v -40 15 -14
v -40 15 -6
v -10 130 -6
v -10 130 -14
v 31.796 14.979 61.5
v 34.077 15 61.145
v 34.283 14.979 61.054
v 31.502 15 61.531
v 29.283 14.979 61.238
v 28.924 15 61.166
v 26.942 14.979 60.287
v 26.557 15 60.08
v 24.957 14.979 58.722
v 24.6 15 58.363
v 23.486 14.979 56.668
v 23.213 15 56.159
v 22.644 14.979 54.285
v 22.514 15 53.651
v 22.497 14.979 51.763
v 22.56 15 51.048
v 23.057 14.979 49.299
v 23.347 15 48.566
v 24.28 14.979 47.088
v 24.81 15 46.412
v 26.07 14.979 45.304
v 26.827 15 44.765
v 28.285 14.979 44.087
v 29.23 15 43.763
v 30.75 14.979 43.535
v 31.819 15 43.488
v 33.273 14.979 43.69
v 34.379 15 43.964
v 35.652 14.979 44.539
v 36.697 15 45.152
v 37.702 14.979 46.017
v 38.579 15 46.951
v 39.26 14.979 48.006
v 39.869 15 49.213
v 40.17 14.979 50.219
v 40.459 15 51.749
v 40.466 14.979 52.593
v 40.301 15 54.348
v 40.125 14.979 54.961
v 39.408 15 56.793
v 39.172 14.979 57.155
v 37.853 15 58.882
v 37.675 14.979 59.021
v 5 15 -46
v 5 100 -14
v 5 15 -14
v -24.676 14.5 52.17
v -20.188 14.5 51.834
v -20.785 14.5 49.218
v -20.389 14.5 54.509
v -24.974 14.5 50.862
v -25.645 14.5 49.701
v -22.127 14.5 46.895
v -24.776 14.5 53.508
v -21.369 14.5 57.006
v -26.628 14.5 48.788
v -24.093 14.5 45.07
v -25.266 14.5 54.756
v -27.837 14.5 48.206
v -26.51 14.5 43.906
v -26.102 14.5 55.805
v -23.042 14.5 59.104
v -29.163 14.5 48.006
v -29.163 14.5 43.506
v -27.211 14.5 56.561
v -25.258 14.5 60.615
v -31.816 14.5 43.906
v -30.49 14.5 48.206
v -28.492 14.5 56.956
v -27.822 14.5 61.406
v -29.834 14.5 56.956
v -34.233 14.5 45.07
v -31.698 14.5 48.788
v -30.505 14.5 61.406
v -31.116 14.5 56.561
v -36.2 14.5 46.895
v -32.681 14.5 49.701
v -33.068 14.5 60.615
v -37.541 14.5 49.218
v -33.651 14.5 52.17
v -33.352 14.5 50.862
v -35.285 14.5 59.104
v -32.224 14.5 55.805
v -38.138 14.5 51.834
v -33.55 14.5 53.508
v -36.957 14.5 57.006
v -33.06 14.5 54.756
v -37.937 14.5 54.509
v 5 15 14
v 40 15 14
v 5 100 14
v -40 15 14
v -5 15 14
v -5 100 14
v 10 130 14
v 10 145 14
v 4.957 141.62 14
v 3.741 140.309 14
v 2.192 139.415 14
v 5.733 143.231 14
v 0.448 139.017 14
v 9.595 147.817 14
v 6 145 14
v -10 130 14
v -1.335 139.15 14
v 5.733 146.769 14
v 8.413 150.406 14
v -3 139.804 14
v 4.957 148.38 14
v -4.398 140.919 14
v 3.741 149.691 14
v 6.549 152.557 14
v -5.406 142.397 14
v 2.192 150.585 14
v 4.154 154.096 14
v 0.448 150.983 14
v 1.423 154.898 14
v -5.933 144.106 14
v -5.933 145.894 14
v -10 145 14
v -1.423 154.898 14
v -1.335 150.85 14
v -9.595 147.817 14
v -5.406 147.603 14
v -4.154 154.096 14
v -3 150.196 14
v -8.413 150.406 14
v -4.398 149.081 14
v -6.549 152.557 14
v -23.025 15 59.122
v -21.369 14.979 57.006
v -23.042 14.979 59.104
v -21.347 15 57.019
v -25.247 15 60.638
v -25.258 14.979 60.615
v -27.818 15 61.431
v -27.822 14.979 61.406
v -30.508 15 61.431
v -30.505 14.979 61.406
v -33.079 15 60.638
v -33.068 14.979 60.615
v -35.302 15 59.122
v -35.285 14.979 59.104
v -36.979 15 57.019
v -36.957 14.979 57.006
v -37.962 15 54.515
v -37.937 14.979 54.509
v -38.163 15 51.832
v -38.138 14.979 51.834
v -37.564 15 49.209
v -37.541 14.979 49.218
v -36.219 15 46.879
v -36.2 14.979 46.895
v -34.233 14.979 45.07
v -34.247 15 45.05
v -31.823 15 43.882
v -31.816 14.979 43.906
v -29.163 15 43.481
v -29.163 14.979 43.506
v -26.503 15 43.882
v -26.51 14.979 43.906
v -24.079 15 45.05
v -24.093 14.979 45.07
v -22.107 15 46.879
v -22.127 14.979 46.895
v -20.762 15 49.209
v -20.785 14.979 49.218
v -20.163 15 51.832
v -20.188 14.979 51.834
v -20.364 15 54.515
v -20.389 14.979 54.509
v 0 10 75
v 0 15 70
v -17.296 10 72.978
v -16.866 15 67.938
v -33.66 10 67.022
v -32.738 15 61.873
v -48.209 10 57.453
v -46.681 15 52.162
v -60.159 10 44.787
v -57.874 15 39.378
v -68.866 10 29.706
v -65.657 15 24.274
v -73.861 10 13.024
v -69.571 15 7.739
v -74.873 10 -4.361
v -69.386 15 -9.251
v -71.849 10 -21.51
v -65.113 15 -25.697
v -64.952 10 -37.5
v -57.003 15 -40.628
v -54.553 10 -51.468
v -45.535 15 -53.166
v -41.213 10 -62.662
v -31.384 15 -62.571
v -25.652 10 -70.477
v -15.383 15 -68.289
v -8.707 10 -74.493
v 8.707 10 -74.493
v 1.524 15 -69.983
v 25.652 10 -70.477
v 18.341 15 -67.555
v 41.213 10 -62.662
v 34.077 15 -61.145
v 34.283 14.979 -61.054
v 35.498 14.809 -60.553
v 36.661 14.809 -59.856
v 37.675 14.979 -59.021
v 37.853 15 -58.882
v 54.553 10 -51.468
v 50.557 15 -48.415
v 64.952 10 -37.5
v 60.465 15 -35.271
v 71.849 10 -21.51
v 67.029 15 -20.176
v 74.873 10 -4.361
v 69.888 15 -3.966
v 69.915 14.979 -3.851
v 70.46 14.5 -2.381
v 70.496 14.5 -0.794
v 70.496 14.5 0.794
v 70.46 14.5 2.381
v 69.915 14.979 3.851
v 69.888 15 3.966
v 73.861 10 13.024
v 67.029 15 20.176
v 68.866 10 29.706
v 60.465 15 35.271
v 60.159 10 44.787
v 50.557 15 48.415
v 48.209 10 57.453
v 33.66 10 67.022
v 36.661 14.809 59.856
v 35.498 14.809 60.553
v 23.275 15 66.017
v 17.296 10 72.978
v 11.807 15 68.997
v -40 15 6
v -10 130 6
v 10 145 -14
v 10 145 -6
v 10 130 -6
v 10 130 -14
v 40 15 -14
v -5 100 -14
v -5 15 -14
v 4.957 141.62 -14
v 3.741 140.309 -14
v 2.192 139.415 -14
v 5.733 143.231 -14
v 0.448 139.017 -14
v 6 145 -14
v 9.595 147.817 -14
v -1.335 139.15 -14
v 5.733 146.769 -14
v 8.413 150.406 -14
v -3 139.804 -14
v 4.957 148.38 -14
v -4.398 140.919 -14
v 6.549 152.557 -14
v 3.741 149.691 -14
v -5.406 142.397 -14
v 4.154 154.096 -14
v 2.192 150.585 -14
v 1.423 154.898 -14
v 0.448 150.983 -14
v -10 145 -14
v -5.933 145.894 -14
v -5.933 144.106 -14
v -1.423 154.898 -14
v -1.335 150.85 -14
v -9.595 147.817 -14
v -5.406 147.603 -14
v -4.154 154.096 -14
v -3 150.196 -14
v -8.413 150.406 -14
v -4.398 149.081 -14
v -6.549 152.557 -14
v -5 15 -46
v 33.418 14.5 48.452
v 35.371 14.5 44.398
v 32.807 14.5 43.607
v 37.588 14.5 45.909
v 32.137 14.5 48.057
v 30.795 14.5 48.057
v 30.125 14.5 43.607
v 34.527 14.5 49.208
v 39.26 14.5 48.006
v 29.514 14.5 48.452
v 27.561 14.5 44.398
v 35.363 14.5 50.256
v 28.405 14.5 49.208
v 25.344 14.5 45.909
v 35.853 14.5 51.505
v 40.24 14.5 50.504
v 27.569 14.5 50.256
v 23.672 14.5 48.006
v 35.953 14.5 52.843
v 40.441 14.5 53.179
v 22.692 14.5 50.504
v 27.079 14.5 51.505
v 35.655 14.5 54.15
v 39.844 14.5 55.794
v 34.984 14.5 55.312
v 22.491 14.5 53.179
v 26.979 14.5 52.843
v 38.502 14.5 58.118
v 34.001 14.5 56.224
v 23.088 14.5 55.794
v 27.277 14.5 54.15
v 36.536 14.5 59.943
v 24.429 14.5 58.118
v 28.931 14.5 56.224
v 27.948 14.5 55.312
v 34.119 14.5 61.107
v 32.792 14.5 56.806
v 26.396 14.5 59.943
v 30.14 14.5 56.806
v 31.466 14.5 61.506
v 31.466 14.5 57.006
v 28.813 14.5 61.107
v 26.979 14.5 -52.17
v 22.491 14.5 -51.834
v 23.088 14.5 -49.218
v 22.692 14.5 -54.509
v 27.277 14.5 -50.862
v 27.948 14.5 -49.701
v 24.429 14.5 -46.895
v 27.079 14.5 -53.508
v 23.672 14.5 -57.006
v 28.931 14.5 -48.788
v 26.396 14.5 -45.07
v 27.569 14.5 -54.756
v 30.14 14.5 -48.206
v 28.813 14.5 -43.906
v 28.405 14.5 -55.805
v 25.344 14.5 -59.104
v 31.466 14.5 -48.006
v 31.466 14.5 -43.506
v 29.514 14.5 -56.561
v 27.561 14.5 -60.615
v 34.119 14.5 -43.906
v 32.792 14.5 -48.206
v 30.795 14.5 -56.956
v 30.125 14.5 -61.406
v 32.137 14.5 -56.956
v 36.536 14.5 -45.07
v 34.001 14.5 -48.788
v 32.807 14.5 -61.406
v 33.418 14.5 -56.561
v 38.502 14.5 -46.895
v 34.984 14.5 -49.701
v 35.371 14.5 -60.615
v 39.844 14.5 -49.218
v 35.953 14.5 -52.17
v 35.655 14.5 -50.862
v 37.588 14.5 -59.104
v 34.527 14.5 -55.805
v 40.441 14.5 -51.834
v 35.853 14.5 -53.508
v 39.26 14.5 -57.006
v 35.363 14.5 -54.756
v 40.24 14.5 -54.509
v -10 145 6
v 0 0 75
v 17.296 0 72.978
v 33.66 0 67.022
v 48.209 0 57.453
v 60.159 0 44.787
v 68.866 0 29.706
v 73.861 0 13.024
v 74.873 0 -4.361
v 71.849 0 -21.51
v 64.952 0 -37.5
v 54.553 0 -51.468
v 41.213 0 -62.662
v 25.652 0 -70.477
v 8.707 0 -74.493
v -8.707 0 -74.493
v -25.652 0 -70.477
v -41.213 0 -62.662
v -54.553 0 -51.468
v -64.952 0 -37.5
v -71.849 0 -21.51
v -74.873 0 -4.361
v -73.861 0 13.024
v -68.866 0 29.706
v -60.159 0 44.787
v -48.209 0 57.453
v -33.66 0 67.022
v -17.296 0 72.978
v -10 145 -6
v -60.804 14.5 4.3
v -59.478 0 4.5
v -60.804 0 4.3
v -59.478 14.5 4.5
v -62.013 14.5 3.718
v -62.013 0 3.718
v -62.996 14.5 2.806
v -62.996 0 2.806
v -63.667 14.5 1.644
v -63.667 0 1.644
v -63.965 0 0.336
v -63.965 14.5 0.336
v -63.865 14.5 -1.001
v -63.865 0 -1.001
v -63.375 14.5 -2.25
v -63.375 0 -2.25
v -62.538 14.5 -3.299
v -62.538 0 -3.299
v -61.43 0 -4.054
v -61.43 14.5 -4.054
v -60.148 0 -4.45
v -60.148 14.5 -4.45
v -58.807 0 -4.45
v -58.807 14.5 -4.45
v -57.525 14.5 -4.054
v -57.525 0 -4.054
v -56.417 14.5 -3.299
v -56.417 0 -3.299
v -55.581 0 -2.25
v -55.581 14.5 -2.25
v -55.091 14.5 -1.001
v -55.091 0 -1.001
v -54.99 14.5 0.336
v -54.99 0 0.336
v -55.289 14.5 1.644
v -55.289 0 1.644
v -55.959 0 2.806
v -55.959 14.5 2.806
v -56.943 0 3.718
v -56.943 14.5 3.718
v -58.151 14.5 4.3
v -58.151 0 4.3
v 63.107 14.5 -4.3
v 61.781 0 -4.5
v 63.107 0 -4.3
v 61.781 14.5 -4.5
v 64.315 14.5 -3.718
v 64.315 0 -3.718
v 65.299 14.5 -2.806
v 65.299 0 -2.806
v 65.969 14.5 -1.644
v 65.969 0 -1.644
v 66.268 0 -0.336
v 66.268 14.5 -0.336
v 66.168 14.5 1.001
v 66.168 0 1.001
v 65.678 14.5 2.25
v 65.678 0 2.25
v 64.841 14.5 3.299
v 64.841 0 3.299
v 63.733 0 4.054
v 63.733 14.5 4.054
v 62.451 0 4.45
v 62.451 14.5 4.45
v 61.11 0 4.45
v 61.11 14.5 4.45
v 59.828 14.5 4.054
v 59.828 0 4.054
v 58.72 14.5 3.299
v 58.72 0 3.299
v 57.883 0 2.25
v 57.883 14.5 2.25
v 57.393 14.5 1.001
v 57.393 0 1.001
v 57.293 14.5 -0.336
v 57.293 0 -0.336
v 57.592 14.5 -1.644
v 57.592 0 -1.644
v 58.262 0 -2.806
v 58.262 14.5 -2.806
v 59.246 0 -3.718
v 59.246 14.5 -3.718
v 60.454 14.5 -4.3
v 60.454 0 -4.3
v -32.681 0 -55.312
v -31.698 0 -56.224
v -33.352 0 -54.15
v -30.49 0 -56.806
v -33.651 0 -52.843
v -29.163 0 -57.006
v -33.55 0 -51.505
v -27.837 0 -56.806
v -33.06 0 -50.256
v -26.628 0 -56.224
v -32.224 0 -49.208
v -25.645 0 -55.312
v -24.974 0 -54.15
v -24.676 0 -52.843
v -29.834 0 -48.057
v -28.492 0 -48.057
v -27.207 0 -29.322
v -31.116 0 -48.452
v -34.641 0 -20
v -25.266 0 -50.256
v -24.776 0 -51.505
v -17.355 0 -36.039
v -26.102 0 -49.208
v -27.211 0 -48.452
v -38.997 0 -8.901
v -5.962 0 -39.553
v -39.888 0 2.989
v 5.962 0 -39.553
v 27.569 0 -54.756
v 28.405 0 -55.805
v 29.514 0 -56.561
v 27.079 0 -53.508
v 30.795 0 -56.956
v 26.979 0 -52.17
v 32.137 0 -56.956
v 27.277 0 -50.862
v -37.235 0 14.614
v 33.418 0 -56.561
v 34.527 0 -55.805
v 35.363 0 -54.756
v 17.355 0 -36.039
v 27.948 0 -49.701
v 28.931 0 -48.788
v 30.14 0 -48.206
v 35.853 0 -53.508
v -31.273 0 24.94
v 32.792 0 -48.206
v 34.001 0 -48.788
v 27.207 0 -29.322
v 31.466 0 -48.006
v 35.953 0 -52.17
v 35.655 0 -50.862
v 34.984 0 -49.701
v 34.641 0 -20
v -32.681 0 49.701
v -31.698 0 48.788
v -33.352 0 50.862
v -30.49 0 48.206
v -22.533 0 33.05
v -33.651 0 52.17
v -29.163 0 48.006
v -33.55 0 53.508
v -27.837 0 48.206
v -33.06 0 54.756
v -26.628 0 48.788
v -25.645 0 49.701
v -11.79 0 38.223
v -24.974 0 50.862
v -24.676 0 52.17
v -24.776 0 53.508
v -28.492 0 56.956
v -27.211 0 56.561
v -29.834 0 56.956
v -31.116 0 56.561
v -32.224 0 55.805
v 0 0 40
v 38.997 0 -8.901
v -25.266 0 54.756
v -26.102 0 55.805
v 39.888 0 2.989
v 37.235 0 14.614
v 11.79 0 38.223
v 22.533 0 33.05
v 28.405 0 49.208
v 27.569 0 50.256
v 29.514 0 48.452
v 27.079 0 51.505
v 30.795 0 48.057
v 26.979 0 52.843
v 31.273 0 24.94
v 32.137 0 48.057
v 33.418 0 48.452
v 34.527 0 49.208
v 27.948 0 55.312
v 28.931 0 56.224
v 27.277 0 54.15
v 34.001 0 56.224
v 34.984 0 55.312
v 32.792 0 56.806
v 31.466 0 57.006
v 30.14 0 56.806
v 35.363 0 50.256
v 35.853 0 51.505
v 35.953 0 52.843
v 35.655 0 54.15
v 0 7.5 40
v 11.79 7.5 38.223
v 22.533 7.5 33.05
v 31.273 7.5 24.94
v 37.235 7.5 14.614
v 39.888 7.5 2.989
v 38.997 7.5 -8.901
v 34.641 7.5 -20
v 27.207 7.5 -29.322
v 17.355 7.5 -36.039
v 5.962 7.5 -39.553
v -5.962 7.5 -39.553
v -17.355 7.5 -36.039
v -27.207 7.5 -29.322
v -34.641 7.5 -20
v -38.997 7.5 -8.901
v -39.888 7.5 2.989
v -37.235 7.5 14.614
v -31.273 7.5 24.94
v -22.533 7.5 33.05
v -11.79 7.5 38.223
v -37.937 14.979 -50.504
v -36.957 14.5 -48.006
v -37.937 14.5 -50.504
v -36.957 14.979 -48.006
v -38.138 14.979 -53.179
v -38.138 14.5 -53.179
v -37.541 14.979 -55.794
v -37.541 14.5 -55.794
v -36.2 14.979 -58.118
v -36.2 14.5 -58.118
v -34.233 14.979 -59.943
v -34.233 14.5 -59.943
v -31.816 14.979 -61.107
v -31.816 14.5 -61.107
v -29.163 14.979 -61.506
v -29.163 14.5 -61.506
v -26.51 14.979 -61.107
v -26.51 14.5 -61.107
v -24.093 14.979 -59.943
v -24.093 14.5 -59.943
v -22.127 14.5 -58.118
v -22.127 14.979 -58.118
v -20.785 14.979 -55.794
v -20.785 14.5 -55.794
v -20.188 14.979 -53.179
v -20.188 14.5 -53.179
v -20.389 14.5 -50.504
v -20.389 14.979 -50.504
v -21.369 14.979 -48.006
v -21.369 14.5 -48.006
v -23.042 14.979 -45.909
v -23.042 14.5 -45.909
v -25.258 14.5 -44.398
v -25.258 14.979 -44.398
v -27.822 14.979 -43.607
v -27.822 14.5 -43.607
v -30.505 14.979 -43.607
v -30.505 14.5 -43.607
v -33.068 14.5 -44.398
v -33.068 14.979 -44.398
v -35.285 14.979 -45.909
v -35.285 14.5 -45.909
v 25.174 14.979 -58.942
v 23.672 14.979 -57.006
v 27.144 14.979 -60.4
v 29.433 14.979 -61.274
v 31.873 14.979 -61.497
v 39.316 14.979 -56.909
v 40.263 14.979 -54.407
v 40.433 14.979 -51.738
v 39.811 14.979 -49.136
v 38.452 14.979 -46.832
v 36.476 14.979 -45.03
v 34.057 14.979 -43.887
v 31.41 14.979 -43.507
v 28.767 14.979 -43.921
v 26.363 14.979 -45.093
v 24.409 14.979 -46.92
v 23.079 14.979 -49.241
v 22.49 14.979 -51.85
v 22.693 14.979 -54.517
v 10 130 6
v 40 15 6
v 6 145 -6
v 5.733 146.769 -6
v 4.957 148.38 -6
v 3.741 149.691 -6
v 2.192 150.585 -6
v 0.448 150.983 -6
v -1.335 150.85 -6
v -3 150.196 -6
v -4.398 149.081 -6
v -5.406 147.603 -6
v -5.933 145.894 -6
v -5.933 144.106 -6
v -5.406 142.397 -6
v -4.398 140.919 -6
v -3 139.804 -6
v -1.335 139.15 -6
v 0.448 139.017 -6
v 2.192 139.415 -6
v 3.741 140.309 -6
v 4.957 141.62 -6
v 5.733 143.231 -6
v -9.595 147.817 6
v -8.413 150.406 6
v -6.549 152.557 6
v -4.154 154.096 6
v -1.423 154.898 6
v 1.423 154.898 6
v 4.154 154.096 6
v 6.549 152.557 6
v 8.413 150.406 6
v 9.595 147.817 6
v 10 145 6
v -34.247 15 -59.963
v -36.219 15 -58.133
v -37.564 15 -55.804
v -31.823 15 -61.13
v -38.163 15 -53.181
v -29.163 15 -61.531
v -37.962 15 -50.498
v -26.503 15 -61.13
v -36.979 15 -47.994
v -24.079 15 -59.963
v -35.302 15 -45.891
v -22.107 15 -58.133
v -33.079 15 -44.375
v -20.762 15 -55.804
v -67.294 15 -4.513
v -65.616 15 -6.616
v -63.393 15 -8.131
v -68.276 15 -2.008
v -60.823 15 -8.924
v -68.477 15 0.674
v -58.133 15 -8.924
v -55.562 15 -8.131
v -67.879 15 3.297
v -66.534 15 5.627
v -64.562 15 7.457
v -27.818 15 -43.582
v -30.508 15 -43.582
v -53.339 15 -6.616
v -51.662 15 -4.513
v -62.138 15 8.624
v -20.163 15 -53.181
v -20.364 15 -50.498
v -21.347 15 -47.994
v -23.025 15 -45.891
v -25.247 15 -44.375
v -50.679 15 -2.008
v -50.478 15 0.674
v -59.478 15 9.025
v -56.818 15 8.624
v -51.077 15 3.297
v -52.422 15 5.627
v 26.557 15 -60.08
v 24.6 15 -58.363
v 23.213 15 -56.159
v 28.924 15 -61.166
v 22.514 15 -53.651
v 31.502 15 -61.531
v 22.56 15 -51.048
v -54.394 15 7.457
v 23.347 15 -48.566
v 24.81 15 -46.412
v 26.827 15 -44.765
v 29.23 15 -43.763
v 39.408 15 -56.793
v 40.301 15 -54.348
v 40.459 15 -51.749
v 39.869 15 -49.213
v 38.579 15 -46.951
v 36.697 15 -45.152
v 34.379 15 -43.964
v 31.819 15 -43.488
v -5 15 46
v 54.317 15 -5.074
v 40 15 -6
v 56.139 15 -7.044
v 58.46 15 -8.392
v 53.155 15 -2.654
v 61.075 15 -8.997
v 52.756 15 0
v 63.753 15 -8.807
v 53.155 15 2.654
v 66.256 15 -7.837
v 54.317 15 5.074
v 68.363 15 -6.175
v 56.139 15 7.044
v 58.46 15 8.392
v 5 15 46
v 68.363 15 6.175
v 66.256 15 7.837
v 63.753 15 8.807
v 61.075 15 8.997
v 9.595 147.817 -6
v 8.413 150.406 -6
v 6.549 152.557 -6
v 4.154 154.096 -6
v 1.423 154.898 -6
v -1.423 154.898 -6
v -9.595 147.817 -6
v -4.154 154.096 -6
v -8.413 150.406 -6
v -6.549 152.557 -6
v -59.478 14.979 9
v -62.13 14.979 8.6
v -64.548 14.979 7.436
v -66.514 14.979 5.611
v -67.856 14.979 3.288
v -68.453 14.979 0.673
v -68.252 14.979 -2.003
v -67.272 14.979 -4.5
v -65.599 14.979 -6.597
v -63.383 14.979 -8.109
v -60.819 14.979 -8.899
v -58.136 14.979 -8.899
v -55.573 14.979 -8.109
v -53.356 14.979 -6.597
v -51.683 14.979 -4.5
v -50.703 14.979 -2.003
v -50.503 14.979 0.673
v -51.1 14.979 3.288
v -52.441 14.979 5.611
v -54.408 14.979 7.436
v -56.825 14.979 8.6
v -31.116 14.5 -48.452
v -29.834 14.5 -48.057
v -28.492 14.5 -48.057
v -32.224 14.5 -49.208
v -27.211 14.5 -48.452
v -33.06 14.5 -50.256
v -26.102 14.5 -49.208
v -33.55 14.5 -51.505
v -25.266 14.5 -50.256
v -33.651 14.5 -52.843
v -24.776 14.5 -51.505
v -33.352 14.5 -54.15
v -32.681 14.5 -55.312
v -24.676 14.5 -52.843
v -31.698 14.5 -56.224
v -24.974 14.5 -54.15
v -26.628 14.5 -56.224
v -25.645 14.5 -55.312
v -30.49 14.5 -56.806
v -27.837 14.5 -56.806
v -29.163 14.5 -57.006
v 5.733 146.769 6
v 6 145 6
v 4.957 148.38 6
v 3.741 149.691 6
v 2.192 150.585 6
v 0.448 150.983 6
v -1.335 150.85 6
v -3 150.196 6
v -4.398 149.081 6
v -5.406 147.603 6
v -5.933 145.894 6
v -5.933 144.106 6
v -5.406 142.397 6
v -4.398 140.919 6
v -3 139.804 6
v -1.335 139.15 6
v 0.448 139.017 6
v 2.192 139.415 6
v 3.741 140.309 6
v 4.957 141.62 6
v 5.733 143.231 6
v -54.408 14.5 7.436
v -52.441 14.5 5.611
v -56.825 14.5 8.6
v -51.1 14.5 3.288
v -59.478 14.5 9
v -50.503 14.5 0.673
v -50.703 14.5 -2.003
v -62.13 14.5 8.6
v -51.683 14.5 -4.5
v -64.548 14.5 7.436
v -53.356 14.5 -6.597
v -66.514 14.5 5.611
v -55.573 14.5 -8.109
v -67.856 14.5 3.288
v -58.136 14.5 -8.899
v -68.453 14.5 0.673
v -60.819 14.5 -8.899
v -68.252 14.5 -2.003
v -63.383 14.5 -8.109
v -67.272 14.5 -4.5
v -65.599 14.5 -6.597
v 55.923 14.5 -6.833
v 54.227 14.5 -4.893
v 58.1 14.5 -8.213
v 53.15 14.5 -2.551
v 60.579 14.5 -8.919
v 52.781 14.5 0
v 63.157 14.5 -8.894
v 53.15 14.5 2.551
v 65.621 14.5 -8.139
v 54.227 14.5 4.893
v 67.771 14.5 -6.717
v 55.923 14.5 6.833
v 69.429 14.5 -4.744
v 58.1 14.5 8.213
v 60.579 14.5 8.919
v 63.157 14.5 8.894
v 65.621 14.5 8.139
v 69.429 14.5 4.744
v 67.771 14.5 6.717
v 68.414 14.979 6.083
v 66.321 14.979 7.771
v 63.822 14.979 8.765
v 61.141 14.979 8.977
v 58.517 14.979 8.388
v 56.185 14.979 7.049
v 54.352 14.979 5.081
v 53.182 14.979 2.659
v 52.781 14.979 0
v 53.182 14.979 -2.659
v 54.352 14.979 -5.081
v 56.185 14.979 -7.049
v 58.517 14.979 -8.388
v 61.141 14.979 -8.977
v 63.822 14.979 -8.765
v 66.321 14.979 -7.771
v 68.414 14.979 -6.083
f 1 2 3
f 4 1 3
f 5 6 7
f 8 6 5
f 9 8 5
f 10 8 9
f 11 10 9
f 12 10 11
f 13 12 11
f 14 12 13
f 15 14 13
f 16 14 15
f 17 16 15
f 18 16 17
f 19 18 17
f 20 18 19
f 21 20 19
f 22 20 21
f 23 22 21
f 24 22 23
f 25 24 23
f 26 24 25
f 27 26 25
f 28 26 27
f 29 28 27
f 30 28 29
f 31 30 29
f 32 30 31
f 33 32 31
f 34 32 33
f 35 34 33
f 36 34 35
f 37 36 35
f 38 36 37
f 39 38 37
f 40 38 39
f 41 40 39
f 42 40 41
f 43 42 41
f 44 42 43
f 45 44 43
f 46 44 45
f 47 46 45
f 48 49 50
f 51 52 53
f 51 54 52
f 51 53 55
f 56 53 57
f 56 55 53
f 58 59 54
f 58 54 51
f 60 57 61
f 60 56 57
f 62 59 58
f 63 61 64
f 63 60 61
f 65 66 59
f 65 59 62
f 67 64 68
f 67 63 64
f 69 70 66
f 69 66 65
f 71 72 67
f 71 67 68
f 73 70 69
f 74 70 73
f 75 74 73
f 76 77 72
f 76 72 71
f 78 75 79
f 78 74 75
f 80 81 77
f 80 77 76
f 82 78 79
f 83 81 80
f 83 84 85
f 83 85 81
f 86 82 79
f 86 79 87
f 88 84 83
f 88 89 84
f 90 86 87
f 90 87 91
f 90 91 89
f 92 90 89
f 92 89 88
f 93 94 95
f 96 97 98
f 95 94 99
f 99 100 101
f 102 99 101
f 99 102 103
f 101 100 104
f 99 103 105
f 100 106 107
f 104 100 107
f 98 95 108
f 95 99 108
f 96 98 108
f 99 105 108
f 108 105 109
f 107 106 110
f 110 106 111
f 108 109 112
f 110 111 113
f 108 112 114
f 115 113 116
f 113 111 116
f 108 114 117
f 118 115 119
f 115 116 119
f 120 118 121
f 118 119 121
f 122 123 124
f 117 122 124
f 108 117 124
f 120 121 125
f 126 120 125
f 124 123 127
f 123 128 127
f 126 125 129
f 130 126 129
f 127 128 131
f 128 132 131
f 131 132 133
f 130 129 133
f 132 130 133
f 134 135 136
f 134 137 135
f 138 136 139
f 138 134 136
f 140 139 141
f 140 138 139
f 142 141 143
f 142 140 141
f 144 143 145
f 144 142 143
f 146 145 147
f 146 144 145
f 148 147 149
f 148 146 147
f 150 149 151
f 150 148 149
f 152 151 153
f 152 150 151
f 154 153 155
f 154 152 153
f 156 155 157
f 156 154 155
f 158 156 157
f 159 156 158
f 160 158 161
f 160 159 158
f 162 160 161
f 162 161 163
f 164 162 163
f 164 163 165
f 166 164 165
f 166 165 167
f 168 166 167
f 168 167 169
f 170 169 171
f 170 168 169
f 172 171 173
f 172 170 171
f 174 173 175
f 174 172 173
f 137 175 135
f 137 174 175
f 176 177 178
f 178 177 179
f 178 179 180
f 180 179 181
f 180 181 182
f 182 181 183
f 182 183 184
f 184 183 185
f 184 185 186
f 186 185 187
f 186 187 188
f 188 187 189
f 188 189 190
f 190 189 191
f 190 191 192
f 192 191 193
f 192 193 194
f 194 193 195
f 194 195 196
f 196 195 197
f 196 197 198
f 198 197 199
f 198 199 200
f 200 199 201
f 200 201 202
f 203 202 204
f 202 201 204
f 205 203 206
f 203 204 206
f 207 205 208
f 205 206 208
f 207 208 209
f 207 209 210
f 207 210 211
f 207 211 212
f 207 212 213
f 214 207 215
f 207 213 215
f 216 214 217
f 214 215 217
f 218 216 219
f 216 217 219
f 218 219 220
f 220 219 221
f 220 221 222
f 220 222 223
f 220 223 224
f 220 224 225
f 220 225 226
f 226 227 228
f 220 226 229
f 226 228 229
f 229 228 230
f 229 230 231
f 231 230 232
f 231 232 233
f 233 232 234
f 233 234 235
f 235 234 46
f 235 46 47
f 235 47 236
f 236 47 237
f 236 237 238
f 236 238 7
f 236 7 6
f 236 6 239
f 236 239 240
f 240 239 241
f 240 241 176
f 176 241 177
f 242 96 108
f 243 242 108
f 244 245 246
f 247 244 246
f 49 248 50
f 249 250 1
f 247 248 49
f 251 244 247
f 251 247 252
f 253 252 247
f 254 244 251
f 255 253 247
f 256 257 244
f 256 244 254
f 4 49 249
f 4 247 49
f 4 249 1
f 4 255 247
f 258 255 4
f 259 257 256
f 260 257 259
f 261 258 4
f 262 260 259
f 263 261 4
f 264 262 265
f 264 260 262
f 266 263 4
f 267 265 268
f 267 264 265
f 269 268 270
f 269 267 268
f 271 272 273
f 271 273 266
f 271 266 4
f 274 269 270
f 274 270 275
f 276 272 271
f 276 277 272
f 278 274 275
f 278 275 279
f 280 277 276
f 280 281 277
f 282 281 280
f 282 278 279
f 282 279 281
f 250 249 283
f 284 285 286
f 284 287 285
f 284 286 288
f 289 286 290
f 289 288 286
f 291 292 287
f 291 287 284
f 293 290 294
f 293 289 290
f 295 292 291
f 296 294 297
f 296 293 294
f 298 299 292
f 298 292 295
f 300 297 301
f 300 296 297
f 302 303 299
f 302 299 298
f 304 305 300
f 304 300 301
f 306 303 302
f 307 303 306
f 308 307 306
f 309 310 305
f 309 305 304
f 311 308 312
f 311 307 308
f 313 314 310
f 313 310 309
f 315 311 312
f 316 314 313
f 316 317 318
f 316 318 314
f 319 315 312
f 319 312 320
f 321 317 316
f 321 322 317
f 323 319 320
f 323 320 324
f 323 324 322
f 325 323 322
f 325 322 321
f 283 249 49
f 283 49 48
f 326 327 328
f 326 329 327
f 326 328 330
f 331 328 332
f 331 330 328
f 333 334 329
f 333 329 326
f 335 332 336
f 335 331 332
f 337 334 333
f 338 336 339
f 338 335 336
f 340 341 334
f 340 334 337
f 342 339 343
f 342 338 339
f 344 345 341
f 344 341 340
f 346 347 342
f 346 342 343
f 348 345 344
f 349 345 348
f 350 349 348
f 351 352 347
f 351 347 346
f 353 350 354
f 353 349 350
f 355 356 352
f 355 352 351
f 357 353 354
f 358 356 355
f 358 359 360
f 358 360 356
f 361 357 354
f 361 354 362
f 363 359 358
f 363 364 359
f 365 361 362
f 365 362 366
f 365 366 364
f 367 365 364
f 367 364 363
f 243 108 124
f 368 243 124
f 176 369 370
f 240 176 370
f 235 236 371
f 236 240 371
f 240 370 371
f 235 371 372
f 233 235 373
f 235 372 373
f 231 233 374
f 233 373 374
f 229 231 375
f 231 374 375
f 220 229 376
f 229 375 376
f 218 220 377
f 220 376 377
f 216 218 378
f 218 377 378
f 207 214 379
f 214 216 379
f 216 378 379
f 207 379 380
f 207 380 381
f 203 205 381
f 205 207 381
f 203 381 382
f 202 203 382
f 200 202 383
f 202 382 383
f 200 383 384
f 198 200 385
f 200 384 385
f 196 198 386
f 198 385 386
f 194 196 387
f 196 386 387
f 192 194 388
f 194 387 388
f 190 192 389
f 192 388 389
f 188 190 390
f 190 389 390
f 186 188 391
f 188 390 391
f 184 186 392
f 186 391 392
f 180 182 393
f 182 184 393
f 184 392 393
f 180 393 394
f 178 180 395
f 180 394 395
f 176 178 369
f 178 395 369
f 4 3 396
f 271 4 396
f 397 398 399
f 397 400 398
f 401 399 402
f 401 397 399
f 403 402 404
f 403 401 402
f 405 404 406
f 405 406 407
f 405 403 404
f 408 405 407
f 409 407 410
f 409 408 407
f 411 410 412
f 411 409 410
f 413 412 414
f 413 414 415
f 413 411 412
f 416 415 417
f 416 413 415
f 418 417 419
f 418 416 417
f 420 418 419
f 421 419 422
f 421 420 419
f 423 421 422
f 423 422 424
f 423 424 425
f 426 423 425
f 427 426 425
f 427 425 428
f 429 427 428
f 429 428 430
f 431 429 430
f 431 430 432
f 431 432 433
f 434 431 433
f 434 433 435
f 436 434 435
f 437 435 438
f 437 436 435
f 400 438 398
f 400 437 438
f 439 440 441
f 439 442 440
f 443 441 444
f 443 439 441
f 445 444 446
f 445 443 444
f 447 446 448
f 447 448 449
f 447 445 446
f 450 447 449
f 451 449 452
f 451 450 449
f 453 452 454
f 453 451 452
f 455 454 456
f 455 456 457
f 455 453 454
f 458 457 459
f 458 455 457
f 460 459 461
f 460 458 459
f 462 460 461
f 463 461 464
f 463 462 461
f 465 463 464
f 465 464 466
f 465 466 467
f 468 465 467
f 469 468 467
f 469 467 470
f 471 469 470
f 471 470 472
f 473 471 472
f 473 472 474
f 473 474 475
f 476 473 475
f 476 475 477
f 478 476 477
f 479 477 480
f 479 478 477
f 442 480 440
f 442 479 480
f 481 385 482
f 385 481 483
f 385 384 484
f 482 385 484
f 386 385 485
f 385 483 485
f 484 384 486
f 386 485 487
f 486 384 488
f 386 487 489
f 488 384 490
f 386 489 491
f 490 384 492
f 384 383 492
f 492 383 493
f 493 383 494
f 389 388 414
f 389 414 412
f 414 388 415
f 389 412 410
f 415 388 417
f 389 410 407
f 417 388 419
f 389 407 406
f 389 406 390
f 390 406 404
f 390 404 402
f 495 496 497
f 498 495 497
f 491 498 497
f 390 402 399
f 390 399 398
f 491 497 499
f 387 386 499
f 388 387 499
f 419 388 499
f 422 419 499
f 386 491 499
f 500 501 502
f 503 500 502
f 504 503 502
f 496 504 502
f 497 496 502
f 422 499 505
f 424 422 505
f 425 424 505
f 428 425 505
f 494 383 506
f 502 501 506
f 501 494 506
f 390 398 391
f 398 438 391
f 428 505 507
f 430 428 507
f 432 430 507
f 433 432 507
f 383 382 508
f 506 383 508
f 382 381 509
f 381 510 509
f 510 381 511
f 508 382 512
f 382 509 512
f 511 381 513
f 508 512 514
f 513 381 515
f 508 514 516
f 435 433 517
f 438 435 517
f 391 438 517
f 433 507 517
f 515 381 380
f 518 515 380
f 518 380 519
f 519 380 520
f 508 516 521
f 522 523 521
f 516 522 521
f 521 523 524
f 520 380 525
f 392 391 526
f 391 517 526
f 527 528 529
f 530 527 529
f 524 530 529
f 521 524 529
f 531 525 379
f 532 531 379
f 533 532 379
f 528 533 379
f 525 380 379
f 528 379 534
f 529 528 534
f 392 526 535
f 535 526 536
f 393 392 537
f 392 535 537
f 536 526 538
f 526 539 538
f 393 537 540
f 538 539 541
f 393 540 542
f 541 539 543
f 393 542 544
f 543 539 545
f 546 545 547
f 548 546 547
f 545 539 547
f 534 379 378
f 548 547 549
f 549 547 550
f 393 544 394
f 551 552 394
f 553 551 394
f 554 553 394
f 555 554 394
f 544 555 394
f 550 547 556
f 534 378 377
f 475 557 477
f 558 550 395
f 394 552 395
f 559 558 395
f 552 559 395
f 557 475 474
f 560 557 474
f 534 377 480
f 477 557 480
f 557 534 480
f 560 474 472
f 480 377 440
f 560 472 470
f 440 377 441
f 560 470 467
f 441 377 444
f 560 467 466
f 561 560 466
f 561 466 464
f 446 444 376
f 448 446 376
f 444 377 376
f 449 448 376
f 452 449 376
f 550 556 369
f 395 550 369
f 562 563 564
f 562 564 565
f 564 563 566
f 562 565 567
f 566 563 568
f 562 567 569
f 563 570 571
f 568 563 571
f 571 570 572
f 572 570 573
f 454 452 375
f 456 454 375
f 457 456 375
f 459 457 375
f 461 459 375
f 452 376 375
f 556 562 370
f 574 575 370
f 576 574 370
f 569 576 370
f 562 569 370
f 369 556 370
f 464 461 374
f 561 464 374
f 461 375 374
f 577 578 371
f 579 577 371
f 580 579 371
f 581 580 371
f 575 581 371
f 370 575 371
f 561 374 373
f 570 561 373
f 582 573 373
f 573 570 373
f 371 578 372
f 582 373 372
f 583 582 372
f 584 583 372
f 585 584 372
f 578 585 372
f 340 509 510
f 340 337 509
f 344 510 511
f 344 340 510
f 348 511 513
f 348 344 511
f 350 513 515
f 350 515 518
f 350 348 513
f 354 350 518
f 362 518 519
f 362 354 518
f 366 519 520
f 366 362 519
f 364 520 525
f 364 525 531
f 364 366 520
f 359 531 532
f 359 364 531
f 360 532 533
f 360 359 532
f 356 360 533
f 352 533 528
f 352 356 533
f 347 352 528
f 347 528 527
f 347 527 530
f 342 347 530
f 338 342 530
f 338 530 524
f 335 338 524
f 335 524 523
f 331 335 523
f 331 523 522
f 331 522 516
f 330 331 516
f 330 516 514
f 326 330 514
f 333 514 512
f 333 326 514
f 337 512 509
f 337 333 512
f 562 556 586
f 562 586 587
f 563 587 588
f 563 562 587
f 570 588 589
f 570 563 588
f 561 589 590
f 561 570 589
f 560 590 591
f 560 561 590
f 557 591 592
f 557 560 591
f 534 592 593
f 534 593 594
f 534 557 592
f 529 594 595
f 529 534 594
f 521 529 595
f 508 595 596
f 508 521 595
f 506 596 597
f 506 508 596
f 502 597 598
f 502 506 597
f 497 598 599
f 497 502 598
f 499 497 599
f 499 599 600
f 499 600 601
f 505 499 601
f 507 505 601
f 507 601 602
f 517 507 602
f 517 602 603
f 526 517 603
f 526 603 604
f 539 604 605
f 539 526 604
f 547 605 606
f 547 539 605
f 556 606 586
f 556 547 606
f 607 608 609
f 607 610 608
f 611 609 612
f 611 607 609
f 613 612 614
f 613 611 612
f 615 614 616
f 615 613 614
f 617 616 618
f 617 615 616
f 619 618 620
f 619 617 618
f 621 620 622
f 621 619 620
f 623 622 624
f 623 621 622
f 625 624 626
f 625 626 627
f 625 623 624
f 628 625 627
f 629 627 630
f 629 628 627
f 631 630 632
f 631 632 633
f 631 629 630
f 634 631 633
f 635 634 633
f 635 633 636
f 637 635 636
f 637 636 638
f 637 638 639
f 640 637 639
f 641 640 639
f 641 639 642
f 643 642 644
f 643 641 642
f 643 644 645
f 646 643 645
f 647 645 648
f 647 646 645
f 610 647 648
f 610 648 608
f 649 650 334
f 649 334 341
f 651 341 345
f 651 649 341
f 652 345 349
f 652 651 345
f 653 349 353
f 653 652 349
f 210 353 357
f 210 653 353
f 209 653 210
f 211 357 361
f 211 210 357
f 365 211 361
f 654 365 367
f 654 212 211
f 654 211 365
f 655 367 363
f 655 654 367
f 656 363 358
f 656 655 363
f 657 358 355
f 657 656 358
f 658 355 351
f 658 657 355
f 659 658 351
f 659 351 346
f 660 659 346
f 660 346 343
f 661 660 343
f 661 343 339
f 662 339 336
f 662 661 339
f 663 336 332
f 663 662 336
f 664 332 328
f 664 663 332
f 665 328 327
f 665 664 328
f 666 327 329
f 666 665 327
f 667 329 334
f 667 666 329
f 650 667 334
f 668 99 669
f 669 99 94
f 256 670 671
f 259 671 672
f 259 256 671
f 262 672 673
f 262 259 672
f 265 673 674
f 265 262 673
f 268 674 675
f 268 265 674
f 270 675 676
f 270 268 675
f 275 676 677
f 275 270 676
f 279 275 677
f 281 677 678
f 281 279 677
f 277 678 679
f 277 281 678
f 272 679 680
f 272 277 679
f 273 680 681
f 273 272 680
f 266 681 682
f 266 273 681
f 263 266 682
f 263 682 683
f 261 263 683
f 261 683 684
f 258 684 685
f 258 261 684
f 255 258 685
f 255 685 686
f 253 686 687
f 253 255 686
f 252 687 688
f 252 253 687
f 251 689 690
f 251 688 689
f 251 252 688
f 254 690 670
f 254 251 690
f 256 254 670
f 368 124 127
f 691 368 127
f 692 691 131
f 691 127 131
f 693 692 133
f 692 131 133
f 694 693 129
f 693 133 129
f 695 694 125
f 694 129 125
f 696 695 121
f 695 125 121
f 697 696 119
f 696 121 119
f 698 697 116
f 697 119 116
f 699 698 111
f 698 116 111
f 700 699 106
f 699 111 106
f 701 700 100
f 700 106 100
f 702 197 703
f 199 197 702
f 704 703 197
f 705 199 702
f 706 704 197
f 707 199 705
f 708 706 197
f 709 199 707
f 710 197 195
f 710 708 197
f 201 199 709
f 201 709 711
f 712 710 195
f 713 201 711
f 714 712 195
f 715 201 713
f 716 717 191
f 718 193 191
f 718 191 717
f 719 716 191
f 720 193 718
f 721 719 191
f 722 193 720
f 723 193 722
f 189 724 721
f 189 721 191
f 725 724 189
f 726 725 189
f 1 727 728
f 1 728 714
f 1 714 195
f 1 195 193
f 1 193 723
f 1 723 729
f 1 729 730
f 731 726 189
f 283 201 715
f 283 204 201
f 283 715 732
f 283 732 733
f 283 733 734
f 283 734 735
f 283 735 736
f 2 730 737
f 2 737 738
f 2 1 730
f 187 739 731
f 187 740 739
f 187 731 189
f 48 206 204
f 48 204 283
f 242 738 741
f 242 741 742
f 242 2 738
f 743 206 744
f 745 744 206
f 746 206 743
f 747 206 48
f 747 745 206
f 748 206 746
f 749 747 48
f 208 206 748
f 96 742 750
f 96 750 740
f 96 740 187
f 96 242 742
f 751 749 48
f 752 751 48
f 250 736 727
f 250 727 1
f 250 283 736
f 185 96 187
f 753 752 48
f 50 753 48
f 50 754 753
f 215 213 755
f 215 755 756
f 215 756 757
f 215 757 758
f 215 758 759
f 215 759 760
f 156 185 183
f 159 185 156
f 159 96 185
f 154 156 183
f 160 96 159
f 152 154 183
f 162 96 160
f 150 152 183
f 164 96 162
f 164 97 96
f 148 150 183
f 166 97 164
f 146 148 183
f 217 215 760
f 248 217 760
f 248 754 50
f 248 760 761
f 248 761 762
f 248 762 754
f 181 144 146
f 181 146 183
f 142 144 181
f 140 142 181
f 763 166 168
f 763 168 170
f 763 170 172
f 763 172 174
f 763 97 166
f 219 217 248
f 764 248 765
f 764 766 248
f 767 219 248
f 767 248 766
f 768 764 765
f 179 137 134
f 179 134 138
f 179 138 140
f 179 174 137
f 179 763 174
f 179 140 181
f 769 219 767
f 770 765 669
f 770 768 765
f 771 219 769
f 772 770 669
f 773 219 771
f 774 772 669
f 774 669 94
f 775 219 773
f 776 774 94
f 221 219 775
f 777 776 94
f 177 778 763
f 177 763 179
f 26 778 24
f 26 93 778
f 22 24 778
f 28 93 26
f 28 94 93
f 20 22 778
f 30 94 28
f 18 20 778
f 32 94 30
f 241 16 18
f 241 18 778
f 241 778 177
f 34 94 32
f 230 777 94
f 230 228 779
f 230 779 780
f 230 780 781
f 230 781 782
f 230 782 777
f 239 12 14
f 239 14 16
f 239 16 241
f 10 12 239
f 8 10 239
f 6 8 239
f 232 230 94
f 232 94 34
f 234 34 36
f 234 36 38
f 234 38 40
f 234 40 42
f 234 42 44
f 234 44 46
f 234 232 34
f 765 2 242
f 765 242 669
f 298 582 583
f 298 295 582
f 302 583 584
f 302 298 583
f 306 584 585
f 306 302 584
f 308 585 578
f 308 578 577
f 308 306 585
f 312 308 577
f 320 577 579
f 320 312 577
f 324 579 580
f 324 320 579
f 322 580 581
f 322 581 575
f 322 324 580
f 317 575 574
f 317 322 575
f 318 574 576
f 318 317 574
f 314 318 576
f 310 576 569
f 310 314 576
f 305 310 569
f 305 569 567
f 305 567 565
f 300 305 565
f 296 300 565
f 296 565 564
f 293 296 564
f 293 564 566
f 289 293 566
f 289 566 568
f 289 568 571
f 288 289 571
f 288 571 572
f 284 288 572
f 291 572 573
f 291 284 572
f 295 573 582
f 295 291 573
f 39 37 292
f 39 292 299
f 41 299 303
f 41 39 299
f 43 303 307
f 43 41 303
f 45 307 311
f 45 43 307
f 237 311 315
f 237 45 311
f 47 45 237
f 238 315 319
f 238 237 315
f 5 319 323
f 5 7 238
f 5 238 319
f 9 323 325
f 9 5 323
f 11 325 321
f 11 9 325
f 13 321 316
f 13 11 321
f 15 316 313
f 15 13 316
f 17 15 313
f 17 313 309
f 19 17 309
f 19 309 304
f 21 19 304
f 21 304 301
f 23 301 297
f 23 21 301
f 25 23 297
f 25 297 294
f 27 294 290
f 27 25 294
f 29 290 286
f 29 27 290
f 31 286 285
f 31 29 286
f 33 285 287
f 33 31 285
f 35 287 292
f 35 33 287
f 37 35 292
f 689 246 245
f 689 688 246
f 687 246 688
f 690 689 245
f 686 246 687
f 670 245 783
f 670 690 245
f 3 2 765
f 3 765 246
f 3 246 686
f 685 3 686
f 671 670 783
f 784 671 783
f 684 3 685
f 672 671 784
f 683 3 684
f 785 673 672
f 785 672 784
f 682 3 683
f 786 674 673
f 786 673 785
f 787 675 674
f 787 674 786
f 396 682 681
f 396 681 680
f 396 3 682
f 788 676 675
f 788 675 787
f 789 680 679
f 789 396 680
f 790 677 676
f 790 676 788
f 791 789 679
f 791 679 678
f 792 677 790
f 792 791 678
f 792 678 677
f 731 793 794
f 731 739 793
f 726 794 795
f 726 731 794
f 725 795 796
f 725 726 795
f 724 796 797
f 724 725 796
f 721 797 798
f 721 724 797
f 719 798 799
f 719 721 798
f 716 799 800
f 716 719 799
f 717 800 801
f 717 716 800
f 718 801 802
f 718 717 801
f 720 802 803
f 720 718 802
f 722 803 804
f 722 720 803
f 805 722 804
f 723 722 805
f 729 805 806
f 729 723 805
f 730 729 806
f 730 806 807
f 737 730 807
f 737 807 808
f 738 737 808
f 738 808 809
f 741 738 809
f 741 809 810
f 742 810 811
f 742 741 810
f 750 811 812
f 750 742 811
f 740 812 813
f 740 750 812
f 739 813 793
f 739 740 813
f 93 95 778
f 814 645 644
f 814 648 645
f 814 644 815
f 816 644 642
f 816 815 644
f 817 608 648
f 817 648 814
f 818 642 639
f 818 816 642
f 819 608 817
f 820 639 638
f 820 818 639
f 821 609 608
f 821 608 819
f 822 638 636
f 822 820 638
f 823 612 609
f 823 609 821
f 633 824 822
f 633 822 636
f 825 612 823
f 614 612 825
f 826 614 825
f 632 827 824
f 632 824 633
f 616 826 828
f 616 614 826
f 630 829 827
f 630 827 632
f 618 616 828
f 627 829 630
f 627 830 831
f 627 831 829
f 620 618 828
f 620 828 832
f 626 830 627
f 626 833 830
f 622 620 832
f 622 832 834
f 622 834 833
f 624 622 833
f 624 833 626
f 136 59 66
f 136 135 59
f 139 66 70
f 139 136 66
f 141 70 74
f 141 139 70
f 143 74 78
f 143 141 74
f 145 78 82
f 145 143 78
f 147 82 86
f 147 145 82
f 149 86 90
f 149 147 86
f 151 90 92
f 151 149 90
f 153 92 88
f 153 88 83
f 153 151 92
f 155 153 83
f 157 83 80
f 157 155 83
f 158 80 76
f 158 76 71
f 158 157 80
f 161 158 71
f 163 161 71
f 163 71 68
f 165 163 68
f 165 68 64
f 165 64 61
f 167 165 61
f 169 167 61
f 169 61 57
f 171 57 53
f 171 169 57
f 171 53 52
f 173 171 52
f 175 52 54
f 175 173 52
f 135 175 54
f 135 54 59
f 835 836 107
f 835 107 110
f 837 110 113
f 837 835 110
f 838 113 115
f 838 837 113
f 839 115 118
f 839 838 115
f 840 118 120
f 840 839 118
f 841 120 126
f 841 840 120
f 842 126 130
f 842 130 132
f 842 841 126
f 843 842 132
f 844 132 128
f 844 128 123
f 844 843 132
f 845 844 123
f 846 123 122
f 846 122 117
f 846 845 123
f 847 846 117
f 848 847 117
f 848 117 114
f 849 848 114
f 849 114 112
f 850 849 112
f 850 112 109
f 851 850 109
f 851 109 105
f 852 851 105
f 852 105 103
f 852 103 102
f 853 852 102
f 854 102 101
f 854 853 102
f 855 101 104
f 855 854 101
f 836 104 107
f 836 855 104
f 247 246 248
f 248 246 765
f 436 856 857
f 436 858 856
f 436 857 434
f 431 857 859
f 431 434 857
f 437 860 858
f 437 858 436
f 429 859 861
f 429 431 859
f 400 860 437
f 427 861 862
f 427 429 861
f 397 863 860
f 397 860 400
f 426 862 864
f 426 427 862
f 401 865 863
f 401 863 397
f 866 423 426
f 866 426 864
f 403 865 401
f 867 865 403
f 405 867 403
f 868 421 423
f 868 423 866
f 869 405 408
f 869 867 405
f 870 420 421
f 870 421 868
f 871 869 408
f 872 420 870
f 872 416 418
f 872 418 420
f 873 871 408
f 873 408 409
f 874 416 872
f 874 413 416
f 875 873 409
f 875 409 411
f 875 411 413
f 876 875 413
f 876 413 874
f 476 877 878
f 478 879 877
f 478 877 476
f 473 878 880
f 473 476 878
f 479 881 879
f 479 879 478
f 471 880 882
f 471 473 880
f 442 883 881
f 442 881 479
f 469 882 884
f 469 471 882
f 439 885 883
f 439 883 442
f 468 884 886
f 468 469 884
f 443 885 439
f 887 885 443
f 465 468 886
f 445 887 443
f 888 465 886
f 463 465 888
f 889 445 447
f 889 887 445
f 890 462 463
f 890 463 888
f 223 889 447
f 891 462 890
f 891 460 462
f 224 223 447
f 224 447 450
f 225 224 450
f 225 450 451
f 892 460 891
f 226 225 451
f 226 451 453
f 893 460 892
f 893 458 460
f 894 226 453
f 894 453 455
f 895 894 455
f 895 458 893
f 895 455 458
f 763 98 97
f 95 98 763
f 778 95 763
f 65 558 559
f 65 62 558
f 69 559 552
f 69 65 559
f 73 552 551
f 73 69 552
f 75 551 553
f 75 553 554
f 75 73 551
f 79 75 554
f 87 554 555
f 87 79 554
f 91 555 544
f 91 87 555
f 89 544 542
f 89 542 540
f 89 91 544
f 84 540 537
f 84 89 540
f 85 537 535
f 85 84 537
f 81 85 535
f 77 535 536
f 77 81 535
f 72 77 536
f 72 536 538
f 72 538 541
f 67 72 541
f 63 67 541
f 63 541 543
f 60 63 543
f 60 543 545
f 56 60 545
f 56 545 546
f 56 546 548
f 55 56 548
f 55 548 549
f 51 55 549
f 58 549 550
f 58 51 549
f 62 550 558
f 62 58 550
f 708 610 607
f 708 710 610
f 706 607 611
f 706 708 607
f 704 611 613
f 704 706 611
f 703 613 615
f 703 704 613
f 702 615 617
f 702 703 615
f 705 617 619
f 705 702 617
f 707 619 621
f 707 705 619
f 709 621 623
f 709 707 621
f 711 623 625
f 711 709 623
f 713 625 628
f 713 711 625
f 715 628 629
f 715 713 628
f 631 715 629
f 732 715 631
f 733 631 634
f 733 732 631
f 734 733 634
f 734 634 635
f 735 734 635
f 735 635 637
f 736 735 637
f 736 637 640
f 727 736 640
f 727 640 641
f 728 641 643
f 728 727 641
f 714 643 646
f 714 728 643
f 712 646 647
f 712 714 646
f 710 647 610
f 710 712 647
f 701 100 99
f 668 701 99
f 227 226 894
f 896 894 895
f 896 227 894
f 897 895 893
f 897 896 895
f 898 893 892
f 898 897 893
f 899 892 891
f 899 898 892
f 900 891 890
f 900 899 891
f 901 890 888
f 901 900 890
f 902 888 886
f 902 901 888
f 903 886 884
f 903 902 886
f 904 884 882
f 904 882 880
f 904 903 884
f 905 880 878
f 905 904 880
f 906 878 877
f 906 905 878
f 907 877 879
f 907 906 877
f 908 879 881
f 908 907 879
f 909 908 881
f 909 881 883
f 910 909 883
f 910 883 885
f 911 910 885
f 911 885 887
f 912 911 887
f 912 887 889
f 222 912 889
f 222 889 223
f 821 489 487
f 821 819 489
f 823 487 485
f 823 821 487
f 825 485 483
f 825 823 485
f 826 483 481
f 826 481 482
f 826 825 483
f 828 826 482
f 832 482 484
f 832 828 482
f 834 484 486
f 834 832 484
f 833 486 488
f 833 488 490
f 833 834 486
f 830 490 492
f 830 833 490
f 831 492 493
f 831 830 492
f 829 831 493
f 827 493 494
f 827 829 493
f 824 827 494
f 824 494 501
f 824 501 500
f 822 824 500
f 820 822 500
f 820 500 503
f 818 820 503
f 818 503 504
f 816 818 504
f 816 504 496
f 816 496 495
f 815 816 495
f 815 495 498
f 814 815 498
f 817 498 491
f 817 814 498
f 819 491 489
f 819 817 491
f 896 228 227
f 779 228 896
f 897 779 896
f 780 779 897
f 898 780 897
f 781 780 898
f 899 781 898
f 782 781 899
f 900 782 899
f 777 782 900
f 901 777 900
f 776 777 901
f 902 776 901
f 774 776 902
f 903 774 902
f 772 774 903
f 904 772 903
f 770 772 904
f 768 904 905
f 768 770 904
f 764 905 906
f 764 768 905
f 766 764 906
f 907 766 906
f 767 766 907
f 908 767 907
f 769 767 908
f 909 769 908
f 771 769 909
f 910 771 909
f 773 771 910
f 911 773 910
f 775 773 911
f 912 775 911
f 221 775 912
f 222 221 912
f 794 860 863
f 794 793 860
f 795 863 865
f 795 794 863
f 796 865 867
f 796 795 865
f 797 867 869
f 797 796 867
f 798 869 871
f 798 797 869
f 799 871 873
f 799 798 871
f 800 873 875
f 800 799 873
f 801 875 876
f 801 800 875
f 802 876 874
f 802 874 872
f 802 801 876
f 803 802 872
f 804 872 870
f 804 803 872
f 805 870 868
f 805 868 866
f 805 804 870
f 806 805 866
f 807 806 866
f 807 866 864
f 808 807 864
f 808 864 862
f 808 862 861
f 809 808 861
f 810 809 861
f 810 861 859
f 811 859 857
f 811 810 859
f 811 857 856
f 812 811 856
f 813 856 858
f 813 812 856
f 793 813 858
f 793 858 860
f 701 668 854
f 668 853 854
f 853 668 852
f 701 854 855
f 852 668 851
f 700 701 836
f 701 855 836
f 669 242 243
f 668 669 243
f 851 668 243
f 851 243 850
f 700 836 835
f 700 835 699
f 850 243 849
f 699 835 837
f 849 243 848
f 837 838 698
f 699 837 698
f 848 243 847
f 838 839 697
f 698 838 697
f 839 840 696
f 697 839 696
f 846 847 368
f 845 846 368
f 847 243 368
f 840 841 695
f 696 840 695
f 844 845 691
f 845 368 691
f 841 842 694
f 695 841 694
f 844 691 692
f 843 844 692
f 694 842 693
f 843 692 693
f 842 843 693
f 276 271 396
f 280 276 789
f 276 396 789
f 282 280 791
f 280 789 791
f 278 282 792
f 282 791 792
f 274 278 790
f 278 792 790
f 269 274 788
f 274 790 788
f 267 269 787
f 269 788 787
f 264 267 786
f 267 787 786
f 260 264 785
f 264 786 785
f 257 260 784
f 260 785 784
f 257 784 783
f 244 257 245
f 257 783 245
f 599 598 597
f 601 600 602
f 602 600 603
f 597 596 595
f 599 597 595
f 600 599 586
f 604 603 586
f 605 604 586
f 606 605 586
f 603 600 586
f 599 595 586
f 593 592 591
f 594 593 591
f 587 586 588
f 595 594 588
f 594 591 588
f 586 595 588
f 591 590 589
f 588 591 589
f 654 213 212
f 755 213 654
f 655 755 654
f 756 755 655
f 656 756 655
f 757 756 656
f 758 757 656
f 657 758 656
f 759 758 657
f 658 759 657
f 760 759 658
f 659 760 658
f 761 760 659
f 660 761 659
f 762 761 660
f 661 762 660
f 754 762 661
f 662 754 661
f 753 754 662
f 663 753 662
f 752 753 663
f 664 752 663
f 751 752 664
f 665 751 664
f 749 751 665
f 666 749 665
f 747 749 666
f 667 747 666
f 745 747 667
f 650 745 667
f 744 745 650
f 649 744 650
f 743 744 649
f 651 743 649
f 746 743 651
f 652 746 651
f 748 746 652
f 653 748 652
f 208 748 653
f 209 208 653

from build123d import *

# Parameters (mm, degrees)
SKETCH_2_R               = 75
EXTRUDE_1_DEPTH          = 15
SKETCH_3_R               = 6
EXTRUDE_2_DEPTH          = 14
CUT_EXTRUDE_2_DEPTH      = 188.81639971
CUT_EXTRUDE_2_DEPTH_BACK = 188.81639971
SKETCH_4_W               = 12
SKETCH_4_H               = 150
SKETCH_5_R               = 40
CUT_EXTRUDE_3_DEPTH      = 7.5
CHAMFER_2_SIZE           = 5
RIB_21_REACH             = 189.816
SKETCH_8_WALL_W          = 468.456805058
SKETCH_8_WALL_H          = 10
PATTERN_CIRCULAR_3_COUNT = 6


with BuildPart() as part:
    # 草图2 → 凸台-拉伸1 (new body)
    with BuildSketch(Plane(origin=(0, 0, 0), x_dir=(1, 0, 0), z_dir=(0, 1, 0))):
        with Locations(Location((0, 0, 0), (0, 0, 270))):
            Circle(SKETCH_2_R)
    extrude(amount=EXTRUDE_1_DEPTH)

    # 草图3 → 凸台-拉伸2 (add, symmetric)
    with BuildSketch(Plane.XY):
        with BuildLine():
            Line((10, 145), (10, 130))
            Line((10, 130), (40, 15))
            Line((40, 15), (-40, 15))
            Line((-40, 15), (-10, 130))
            Line((-10, 130), (-10, 145))
            ThreePointArc((-10, 145), (0, 155), (10, 145))
        make_face()
        with Locations((0, 145)):
            Circle(SKETCH_3_R, mode=Mode.SUBTRACT)
    extrude(amount=EXTRUDE_2_DEPTH, both=True)

    # 草图4 → 切除-拉伸2 (cut, two sides: drawn at the far end of the back side and taken through both)
    with BuildSketch(Plane(origin=(0, 0, 0), x_dir=(0, 0, -1), z_dir=(1, 0, 0)).offset(-CUT_EXTRUDE_2_DEPTH_BACK)):
        with Locations((0, 90)):
            Rectangle(SKETCH_4_W, SKETCH_4_H)
    extrude(amount=CUT_EXTRUDE_2_DEPTH + CUT_EXTRUDE_2_DEPTH_BACK, mode=Mode.SUBTRACT)

    # 草图5 → 切除-拉伸3 (cut)
    with BuildSketch(Plane(origin=(0, 0, 0), x_dir=(1, 0, 0), z_dir=(0, 1, 0))):
        with Locations(Location((0, 0, 0), (0, 0, 270))):
            Circle(SKETCH_5_R)
    extrude(amount=CUT_EXTRUDE_3_DEPTH, mode=Mode.SUBTRACT)

    # 倒角2
    chamfer_2_edges = [part.edges().sort_by_distance(p)[0] for p in [
        (0, 15, -75),
    ]]
    chamfer(chamfer_2_edges, length=CHAMFER_2_SIZE)

    # 草图8 wall → 筋21 (add, up to next)
    with BuildSketch(Plane(origin=(0, 57.5, 30), x_dir=(0, -0.935875921829, 0.352329758806), z_dir=(0, -0.352329758806, -0.935875921829)), mode=Mode.PRIVATE) as rib_21_sk1:
        Rectangle(SKETCH_8_WALL_W, SKETCH_8_WALL_H)
    rib_21_tool1 = extrude(rib_21_sk1.sketch, amount=RIB_21_REACH, mode=Mode.PRIVATE) - part.part
    rib_21 = rib_21_tool1.solids().sort_by_distance((0, 57.5, 30))[0]
    add(rib_21)

    # 镜向1: 筋21 across plane
    add(rib_21.mirror(Plane.XY))

    # 草图24 → M8 六角头螺栓C级的柱形沉头孔7 (revolve, cut)
    with BuildSketch(Plane(origin=(-59.477689935, 15, 0), x_dir=(0, 0, 1), z_dir=(1, 0, 0))):
        Polygon((0, 0), (0, 15), (4.5, 15), (4.5, 0.5), (9, 0.5), (9, 0.020977491), (9.025, 0), align=None)
    m8_c_7 = revolve(axis=Axis((-59.477689935, 21.35, 0), (0, -1, 0)), mode=Mode.SUBTRACT)

    # 阵列(圆周)3: M8 六角头螺栓C级的柱形沉头孔7 ×6 about axis
    pattern_circular_3_axis = Axis((1.151424032, 0, 0), (0, 1, 0))
    for i in range(1, PATTERN_CIRCULAR_3_COUNT):
        add(m8_c_7.rotate(pattern_circular_3_axis, i * 360 / PATTERN_CIRCULAR_3_COUNT), mode=Mode.SUBTRACT)


solid = part.part
